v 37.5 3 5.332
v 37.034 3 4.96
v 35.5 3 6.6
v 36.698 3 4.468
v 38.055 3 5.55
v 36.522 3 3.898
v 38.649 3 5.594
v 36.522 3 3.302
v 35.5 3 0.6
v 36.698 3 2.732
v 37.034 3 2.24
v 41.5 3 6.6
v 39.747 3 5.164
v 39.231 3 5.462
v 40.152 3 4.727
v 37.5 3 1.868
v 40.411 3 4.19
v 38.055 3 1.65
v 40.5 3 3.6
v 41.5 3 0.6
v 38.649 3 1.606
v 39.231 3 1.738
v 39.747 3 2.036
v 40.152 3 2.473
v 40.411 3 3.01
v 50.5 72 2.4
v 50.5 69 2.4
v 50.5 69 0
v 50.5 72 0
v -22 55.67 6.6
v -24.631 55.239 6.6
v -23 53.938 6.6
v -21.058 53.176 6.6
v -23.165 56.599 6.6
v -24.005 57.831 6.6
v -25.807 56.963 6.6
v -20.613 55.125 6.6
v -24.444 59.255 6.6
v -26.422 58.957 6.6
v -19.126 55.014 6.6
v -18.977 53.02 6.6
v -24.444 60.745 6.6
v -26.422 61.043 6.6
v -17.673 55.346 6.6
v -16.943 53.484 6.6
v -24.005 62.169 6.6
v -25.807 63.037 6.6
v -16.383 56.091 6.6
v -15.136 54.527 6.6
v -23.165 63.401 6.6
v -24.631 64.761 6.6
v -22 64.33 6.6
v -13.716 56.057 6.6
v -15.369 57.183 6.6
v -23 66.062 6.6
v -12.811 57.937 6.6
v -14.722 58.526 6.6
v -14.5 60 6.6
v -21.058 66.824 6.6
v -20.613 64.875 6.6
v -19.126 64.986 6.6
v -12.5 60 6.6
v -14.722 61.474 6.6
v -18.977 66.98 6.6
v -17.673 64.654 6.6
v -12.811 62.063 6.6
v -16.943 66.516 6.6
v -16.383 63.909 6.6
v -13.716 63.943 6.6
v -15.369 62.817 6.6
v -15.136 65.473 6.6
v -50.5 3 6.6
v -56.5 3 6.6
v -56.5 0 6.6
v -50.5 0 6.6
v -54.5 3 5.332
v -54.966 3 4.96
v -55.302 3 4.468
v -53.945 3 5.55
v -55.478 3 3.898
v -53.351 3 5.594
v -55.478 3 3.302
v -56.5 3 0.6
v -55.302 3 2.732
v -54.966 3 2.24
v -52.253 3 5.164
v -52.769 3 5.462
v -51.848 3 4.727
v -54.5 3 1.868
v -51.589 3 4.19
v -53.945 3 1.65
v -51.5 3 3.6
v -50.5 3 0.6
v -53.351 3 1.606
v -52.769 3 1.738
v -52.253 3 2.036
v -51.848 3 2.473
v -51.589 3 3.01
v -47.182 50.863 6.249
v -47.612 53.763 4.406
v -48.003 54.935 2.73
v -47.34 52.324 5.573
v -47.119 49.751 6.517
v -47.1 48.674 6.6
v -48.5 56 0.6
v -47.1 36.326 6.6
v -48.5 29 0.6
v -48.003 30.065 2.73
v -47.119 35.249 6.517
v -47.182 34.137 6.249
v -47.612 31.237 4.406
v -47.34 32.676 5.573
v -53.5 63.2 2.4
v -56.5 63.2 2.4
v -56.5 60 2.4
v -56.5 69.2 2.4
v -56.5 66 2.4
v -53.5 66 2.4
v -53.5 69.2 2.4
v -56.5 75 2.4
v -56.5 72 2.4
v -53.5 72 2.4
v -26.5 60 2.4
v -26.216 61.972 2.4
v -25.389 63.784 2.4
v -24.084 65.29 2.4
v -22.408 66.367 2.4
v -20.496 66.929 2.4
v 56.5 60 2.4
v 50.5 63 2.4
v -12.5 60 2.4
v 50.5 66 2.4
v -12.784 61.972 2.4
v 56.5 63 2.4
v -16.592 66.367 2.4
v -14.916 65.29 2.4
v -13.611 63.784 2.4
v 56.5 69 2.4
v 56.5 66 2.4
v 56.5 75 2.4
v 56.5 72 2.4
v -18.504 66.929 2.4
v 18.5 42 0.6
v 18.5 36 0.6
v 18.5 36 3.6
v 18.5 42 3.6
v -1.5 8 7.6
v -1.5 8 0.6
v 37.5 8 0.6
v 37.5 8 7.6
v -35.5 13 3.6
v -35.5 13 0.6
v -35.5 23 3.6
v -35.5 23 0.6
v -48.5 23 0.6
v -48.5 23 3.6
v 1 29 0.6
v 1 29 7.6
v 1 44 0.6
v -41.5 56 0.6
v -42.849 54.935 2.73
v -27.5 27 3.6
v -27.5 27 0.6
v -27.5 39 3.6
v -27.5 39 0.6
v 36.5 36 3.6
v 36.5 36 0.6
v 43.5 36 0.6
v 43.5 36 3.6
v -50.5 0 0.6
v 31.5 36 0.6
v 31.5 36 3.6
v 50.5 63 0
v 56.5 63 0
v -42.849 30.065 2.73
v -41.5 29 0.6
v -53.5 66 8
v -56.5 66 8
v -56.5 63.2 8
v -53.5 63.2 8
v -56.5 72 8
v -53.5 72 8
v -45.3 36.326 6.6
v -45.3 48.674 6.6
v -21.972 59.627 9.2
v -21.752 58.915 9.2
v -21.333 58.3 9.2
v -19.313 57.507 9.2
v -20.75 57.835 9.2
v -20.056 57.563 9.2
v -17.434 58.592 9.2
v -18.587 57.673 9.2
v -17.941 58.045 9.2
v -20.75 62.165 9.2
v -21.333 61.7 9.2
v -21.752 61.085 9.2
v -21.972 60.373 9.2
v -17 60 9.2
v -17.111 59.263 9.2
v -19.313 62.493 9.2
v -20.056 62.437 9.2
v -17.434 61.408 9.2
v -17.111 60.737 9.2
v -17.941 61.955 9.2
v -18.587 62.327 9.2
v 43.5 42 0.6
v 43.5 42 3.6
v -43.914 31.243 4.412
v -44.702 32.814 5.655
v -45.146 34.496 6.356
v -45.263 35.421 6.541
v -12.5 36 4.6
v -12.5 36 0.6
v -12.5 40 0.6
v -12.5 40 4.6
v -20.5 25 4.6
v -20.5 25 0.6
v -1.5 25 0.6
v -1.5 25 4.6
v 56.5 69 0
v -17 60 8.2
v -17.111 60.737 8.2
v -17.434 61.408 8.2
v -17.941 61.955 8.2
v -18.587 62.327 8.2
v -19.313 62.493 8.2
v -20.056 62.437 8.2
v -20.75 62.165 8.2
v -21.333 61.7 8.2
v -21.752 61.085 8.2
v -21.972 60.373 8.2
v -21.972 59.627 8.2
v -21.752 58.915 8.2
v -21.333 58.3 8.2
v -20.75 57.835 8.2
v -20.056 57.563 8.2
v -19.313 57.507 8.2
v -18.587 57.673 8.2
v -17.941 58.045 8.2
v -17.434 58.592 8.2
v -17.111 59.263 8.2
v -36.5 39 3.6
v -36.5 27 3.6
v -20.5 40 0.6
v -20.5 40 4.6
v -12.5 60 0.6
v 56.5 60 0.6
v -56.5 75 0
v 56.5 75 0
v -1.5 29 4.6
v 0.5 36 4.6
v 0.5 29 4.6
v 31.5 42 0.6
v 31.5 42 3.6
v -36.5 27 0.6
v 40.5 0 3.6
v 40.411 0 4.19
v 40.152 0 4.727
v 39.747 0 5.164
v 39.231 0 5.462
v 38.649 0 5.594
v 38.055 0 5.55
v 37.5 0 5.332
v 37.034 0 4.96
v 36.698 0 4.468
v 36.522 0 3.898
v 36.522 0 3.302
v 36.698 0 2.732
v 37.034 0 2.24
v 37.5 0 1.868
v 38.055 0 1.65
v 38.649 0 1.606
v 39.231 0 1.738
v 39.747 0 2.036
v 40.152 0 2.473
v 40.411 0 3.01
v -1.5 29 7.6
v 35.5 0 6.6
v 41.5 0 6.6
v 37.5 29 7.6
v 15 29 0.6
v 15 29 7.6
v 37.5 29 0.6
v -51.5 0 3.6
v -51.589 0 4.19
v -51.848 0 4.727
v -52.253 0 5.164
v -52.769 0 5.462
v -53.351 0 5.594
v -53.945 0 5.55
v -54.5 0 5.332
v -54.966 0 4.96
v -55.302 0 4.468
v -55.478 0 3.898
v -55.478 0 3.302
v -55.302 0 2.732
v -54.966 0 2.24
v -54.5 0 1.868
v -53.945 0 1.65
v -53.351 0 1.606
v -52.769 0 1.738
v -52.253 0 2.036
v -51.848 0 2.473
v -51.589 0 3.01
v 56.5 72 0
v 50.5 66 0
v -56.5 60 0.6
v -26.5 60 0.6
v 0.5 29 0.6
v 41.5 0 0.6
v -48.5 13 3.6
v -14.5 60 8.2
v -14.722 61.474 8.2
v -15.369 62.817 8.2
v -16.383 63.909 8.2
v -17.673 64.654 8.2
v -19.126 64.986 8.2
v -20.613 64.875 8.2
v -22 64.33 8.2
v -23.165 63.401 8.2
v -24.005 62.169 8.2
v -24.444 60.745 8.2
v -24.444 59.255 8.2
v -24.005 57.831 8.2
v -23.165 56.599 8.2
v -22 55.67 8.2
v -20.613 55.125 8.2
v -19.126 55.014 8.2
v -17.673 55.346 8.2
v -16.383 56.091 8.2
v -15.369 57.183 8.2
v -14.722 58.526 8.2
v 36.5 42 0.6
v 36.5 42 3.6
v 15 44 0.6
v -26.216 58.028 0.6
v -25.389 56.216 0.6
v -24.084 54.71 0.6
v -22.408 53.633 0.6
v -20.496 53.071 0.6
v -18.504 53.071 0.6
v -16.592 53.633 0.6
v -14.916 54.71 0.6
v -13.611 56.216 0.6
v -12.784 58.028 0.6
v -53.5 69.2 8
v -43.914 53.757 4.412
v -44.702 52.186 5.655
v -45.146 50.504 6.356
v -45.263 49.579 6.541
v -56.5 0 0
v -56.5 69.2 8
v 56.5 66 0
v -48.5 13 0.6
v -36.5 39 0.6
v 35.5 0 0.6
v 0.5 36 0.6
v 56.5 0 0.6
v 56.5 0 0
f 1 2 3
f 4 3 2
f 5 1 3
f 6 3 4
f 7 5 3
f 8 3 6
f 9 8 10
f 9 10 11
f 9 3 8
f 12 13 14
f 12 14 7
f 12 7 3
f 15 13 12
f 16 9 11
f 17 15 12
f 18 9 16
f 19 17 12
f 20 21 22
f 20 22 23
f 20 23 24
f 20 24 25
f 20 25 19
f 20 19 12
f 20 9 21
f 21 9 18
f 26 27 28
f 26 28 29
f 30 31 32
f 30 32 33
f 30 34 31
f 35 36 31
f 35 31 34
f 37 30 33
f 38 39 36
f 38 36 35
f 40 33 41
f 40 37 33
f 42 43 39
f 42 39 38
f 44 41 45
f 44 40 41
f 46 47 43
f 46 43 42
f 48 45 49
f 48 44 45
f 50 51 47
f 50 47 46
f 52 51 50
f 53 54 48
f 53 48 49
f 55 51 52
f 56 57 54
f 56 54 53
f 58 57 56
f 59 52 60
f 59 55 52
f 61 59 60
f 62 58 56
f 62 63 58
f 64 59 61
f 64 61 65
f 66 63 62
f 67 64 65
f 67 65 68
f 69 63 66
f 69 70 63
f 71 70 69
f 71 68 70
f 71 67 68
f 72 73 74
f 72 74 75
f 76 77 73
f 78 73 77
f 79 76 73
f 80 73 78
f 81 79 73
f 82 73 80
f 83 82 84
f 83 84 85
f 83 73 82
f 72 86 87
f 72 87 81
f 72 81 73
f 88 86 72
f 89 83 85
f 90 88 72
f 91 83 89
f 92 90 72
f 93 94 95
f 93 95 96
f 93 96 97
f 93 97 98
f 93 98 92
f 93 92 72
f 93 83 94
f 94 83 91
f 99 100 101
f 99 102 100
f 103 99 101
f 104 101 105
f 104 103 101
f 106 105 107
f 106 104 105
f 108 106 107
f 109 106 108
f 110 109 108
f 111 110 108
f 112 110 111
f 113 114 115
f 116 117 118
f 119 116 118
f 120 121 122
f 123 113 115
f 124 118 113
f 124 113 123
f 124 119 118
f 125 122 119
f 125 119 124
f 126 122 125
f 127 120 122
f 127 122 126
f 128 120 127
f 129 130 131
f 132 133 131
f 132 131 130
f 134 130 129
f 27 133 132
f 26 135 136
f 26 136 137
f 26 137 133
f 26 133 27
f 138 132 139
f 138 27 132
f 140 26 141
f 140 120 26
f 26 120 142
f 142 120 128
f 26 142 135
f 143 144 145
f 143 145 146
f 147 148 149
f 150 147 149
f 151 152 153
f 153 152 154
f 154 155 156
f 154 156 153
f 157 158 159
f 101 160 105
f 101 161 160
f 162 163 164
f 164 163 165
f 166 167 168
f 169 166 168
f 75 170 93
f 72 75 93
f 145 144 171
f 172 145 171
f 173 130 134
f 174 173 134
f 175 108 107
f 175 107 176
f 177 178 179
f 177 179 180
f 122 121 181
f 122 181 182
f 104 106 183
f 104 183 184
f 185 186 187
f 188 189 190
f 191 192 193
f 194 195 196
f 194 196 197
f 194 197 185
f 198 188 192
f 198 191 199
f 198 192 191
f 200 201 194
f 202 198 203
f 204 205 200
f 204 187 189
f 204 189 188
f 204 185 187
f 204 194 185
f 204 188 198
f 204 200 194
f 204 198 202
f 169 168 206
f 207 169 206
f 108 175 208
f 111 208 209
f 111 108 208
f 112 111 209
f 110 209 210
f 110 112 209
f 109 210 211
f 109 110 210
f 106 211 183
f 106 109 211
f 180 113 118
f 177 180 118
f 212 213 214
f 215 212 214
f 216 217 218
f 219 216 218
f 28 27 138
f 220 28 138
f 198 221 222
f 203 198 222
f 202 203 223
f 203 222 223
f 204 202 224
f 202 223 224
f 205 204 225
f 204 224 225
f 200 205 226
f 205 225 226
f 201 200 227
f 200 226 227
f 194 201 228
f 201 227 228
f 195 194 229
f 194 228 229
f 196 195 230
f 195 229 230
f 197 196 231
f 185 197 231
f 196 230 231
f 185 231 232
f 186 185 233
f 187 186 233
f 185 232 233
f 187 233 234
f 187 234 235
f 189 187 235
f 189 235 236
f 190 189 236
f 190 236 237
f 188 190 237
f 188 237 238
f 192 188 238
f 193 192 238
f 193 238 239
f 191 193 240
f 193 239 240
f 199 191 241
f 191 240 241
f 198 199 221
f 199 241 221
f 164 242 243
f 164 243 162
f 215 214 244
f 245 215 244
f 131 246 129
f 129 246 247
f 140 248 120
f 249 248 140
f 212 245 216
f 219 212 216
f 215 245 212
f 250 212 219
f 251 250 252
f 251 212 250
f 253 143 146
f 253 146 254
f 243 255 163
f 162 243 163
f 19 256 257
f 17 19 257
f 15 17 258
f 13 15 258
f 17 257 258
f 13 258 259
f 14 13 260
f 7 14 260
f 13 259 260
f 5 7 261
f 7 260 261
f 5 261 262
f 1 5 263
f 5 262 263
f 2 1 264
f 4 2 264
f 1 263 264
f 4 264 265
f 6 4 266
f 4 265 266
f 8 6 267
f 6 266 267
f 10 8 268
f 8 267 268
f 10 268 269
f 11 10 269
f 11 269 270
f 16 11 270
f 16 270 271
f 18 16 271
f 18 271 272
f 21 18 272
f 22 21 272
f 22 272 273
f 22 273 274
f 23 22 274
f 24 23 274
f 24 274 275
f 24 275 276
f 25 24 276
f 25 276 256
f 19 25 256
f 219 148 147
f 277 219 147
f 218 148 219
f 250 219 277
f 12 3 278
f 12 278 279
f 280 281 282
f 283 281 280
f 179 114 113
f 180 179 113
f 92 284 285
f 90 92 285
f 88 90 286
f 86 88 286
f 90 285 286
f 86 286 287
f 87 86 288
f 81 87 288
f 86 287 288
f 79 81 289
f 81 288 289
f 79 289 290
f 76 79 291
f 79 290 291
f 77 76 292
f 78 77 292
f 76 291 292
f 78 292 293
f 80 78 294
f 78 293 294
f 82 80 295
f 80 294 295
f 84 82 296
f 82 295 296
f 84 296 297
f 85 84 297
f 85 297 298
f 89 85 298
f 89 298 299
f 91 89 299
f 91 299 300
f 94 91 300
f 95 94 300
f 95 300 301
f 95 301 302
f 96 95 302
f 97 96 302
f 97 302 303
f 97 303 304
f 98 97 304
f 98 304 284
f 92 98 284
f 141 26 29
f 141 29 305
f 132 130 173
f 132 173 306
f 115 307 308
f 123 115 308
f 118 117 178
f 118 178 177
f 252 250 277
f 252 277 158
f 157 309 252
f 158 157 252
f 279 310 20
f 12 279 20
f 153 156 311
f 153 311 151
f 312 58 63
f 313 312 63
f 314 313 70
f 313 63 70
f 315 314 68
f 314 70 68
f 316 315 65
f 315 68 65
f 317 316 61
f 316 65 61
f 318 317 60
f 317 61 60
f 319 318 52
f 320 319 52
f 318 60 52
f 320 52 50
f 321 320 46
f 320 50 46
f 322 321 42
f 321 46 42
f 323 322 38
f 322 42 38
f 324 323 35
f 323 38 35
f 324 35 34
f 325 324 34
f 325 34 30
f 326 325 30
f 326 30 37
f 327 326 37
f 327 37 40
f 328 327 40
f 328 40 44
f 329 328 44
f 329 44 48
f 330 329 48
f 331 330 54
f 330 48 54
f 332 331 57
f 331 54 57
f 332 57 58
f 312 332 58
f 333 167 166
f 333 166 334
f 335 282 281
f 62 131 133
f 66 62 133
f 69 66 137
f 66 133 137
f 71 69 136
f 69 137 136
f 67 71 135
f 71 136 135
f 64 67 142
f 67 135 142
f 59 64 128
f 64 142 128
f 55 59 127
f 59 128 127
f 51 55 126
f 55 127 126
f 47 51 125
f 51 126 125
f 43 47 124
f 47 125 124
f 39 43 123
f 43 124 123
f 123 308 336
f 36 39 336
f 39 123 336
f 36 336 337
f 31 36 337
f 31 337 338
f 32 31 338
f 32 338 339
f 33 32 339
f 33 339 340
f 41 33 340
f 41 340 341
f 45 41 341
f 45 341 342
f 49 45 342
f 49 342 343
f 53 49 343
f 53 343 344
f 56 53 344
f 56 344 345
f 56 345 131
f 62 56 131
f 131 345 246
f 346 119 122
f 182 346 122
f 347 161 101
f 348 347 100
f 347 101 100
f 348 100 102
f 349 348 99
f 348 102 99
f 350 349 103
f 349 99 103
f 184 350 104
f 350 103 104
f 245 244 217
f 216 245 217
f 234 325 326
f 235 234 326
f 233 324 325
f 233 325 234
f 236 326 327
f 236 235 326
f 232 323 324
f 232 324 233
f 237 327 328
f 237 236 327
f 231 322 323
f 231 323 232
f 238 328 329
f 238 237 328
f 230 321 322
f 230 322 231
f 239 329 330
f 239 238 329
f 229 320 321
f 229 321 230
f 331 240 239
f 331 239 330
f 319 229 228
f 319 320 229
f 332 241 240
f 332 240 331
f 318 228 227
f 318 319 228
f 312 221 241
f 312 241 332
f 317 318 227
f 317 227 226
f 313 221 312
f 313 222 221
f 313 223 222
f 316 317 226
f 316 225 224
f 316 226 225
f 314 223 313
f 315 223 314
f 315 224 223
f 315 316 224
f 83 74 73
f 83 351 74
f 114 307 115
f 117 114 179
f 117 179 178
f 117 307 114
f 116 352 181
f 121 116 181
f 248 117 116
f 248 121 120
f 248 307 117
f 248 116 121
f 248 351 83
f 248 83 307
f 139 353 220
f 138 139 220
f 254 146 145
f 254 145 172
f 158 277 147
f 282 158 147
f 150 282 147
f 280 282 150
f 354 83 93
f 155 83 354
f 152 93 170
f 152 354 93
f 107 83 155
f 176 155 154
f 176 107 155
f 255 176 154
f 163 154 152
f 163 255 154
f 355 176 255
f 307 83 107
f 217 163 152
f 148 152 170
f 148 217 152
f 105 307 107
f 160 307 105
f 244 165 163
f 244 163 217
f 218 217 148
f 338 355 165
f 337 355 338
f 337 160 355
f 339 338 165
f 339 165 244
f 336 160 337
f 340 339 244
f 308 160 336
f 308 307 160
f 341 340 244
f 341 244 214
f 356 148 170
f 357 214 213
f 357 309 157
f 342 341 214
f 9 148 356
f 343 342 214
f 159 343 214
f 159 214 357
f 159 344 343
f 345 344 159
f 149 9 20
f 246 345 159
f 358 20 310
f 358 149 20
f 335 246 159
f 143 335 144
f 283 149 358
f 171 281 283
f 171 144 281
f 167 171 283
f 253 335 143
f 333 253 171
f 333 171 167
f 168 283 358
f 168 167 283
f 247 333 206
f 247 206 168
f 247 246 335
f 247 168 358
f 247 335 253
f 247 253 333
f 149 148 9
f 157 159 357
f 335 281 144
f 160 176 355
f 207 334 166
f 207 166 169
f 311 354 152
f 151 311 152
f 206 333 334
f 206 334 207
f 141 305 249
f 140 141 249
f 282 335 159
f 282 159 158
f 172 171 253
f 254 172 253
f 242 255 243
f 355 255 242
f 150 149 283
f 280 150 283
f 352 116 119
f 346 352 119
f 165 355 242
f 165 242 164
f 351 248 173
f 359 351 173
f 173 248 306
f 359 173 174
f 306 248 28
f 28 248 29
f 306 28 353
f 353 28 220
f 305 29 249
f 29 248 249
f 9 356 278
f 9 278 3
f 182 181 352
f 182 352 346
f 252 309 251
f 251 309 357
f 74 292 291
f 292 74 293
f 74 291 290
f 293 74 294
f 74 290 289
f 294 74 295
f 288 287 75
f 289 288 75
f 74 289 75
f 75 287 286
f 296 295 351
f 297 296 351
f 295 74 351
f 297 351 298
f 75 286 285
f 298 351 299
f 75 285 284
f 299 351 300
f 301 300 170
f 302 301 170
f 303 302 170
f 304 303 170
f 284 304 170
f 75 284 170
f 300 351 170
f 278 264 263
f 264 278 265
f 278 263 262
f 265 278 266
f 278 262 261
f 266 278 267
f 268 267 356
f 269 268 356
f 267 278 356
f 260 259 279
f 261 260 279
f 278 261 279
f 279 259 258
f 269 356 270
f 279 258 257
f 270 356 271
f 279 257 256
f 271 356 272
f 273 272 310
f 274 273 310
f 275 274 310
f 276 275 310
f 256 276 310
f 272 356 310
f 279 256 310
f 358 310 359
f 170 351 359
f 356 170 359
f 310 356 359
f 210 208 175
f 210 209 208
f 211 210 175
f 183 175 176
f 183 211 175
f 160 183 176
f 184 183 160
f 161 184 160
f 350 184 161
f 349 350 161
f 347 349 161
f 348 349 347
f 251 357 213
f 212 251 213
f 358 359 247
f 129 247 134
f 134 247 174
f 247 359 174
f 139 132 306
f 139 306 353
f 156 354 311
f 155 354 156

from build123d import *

# Parameters (mm, degrees)
F0_W         = 113
F0_H         = 75
F1_DEPTH     = 0.6
F2_W         = 113
F2_H         = 15
F3_DEPTH     = 1.8
F4_R         = 7
F5_DEPTH     = 6
F6_R         = 5
F7_DEPTH     = 1.6
F8_R         = 2.5
F9_DEPTH     = 1
F10_W        = 13
F10_H        = 10
F10_W_2      = 9
F10_H_2      = 12
F10_H_3      = 6
F10_W_3      = 7
F11_DEPTH    = 3
F13_W        = 39
F13_H        = 21
F14_DEPTH    = 7
F15_DEPTH    = 4
F18_DEPTH    = 14
F19_W        = 7
F19_H        = 27
F21_W        = 1.8
F21_H        = 21
F23_T1_DEPTH = 23.4311896062
F23_T6_DEPTH = 23.4311896062
F24_W        = 3
F24_H        = 2.8
F25_DEPTH    = 5.6
F26_W        = 6
F26_H        = 3
F27_DEPTH    = 3
F28_W        = 6
F28_H        = 3
F29_DEPTH    = 6
F30_R        = 2
F31_DEPTH    = 4


# Not quite as in the source:
# - a fillet or chamfer that OpenCascade refuses, or shapes differently, is made with other operations: its cross-section is extruded or revolved along the edge and cut away or added


with BuildPart() as f1:
    # F0 (on Top) → F1 (new body)
    with BuildSketch(Plane.XY):
        with Locations((0, 37.5)):
            Rectangle(F0_W, F0_H)
    extrude(amount=F1_DEPTH)

    # F2 (on face) → F3 (join)
    with BuildSketch(Plane.XY.offset(0.6)):
        with Locations((0, 67.5)):
            Rectangle(F2_W, F2_H)
    extrude(amount=F3_DEPTH)

    # F4 (on face) → F5 (join)
    with BuildSketch(Plane.XY.offset(0.6)):
        with Locations((-19.5, 60)):
            Circle(F4_R)
    extrude(amount=F5_DEPTH)

    # F6 (on face) → F7 (join)
    with BuildSketch(Plane.XY.offset(6.6)):
        with Locations((-19.5, 60)):
            Circle(F6_R)
    extrude(amount=F7_DEPTH)

    # F8 (on face) → F9 (join)
    with BuildSketch(Plane.XY.offset(8.2)):
        with Locations((-19.5, 60)):
            Circle(F8_R)
    extrude(amount=F9_DEPTH)

    # F10 (on face) → F11 (join)
    with BuildSketch(Plane.XY.offset(0.6)):
        with Locations((-42, 18)):
            Rectangle(F10_W, F10_H)
        with Locations((-32, 33)):
            Rectangle(F10_W_2, F10_H_2)
        with Locations((25, 39)):
            Rectangle(F10_W, F10_H_3)
        with Locations((40, 39)):
            Rectangle(F10_W_3, F10_H_3)
    extrude(amount=F11_DEPTH)

    # F13 (on face) → F14 (join)
    with BuildSketch(Plane.XY.offset(0.6)):
        with Locations((18, 18.5)):
            Rectangle(F13_W, F13_H)
    extrude(amount=F14_DEPTH)

    # F12 (on face) → F15 (join)
    with BuildSketch(Plane.XY.offset(0.6)):
        Polygon((-12.5, 40), (-20.5, 40), (-20.5, 25), (0.5, 25), (0.5, 36), (-12.5, 36), align=None)
    extrude(amount=F15_DEPTH)

    # F17 (on offset) → F18 (join)
    with BuildSketch(Plane.YZ.offset(15)):
        Polygon((29, 0.6), (44, 0.6), (29, 7.6), align=None)
    extrude(amount=-F18_DEPTH)

    # F19 (on face) → F22 section 0
    with BuildSketch(Plane.XY.offset(0.6)):
        with Locations((-45, 42.5)):
            Rectangle(F19_W, F19_H)
    # F21 (on offset) → F22 section 1
    with BuildSketch(Plane.XY.offset(6.6)):
        with Locations((-46.2, 42.5)):
            Rectangle(F21_W, F21_H)
    loft()

    # F23: fillet of radius 7 on 2 edges, made by hand

    # F23_s2 → F23_t1 (cut)
    with BuildSketch(Plane.YZ.offset(-57.9155948031)):
        with BuildLine():
            ThreePointArc((54.9347524158, 2.7304951685), (52.3538798636, 5.5545556585), (48.6737620788, 6.6))
            Line((48.6737620788, 6.6), (53, 6.6))
            Line((53, 6.6), (54.9347524158, 2.7304951685))
        make_face()
    extrude(amount=F23_T1_DEPTH, mode=Mode.SUBTRACT)


with BuildPart() as f23_tool4:
    # F23_s5 → F23_t6 (new body)
    with BuildSketch(Plane.YZ.offset(-57.9155948031)):
        with BuildLine():
            ThreePointArc((30.0652475842, 2.7304951685), (32.6461201364, 5.5545556585), (36.3262379212, 6.6))
            Line((36.3262379212, 6.6), (32, 6.6))
            Line((32, 6.6), (30.0652475842, 2.7304951685))
        make_face()
    extrude(amount=F23_T6_DEPTH)

    split(bisect_by=Plane.YZ.offset(-36.5), keep=Keep.BOTTOM)


with BuildPart() as f1_1:
    add(f1.part)

    # F23_t3: cut F23_tool4
    add(f23_tool4.part, mode=Mode.SUBTRACT)

    # F24 (on face) → F25 (join)
    with BuildSketch(Plane.XY.offset(2.4)):
        with Locations((-55, 70.6)):
            Rectangle(F24_W, F24_H)
        with Locations((-55, 64.6)):
            Rectangle(F24_W, F24_H)
    extrude(amount=F25_DEPTH)

    # F26 (on face) → F27 (cut)
    with BuildSketch(Plane.XY.offset(2.4)):
        with Locations((53.5, 70.5)):
            Rectangle(F26_W, F26_H)
        with Locations((53.5, 64.5)):
            Rectangle(F26_W, F26_H)
    extrude(amount=-F27_DEPTH, mode=Mode.SUBTRACT)

    # F28 (on face) → F29 (join)
    with BuildSketch(Plane.XY.offset(0.6)):
        with Locations((-53.5, 1.5)):
            Rectangle(F28_W, F28_H)
        with Locations((38.5, 1.5)):
            Rectangle(F28_W, F28_H)
    extrude(amount=F29_DEPTH)

    # F30 (on face) → F31 (cut)
    with BuildSketch(Plane.XZ):
        with Locations((-53.5, 3.6)):
            Circle(F30_R)
        with Locations((38.5, 3.6)):
            Circle(F30_R)
    extrude(amount=-F31_DEPTH, mode=Mode.SUBTRACT)


solid = f1_1.part
